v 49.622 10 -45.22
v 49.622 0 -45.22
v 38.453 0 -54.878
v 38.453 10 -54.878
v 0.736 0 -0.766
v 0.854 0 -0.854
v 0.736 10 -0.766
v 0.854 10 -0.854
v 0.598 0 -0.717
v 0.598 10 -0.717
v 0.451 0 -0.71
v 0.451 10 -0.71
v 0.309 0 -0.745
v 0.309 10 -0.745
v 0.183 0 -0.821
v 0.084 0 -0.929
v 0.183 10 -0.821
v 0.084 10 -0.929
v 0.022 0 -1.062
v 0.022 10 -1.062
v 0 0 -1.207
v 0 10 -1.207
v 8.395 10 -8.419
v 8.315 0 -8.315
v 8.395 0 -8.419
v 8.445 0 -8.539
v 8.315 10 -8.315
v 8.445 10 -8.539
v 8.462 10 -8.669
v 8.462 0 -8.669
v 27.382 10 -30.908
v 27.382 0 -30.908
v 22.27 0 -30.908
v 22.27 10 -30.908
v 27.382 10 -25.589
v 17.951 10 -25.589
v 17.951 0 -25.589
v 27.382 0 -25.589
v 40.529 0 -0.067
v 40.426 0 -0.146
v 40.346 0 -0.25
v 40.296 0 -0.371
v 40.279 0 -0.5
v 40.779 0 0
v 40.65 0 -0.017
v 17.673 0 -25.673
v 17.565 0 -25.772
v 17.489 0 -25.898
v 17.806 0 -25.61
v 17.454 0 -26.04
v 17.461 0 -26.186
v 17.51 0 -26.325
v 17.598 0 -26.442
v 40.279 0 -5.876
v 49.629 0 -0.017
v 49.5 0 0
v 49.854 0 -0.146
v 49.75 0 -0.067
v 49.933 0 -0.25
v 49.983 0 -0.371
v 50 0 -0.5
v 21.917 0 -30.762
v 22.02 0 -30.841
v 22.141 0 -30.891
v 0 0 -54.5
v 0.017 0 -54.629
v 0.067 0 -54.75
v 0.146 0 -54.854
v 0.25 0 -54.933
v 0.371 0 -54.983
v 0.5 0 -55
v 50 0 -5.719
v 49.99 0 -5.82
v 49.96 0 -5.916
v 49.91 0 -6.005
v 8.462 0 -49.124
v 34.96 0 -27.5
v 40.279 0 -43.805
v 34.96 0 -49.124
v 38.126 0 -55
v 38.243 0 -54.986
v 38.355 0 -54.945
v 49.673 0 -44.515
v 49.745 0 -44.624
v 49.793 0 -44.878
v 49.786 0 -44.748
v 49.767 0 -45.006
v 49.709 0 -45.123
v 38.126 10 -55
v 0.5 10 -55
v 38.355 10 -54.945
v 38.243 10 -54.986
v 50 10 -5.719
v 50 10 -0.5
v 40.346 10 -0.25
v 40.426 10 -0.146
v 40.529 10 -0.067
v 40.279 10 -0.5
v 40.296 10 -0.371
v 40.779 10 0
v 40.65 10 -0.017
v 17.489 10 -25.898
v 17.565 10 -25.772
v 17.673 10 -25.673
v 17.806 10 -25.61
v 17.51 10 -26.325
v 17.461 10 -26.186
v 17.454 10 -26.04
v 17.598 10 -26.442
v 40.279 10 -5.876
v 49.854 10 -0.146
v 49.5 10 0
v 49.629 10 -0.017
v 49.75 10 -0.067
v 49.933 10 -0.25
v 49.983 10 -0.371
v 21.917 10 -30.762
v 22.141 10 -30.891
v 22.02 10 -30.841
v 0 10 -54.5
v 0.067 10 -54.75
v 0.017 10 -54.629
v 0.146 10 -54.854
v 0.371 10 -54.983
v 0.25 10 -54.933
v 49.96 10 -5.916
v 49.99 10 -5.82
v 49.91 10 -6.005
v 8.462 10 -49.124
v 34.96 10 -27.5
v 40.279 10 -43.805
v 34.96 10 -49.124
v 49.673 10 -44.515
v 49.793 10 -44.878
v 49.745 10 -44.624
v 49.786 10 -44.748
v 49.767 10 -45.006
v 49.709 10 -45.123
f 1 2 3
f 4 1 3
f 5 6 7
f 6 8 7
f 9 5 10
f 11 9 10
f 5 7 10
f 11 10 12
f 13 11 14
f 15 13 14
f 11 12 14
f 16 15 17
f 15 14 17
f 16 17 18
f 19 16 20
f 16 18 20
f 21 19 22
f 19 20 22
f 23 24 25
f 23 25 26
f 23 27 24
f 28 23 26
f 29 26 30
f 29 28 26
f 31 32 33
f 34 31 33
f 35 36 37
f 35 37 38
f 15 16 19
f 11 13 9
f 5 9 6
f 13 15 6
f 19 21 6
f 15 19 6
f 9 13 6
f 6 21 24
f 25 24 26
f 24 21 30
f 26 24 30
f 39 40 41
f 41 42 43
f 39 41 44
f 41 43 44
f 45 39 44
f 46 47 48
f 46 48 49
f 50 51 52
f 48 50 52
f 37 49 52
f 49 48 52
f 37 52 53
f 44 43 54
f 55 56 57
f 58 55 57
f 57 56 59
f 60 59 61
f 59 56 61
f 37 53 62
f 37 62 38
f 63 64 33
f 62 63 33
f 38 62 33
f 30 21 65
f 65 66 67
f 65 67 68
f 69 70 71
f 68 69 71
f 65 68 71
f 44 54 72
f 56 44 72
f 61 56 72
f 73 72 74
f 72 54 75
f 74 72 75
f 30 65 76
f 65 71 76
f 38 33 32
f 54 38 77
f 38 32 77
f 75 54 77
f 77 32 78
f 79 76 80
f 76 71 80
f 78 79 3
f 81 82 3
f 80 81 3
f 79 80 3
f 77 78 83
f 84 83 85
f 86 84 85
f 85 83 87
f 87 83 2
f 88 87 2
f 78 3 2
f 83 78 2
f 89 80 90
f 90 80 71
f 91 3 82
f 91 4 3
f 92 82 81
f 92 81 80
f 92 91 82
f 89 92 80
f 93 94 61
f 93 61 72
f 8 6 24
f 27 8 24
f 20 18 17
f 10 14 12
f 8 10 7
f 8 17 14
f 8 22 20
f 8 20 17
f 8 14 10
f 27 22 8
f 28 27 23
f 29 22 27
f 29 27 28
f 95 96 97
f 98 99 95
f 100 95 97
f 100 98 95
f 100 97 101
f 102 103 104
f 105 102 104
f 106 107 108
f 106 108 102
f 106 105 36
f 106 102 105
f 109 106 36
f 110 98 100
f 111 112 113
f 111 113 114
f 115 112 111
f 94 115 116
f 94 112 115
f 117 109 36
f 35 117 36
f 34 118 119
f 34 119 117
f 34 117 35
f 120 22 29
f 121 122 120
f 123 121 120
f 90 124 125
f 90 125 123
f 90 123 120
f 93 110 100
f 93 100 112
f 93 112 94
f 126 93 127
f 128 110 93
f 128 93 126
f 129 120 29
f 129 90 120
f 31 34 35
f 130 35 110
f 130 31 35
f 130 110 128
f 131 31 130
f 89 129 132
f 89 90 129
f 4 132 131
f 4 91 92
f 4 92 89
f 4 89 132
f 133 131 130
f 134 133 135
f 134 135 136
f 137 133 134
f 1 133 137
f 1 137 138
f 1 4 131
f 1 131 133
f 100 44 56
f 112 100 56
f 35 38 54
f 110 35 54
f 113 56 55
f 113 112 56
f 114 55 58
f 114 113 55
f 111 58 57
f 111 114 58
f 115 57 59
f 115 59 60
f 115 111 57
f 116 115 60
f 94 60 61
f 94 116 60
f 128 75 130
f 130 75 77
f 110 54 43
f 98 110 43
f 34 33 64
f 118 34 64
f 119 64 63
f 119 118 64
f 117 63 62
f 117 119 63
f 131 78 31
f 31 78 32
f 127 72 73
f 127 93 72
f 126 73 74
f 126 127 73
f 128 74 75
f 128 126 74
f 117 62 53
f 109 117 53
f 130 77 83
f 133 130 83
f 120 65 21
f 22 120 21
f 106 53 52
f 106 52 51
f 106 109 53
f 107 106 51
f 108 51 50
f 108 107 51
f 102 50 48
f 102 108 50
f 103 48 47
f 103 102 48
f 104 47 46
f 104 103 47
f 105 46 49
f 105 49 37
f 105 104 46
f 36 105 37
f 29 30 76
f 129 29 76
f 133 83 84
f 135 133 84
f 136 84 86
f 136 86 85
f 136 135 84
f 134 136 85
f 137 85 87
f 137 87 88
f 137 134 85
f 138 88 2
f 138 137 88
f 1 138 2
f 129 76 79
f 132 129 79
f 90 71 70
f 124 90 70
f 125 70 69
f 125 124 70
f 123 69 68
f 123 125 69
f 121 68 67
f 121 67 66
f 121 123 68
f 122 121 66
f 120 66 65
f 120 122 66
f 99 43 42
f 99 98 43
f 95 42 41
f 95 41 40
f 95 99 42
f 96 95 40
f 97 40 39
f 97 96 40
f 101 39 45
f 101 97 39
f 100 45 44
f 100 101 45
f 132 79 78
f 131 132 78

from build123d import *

# Parameters (mm, degrees)
BOSS_EXTRUDE1_DEPTH = 10
FILLET1_R           = 0.5


with BuildPart() as part:
    # Sketch2 → Boss-Extrude1 (new body)
    with BuildSketch(Plane(origin=(0, 0, 0), x_dir=(1, 0, 0), z_dir=(0, 1, 0))):
        Polygon((0, 0), (8.461538462, 8.461538462), (8.461538462, 49.123931624), (34.959843123, 49.123931624), (40.27906686, 43.804707886), (27.382478632, 30.908119658), (22.063254895, 30.908119658), (16.744031157, 25.58889592), (27.382478632, 25.58889592), (40.27906686, 5.876068376), (40.27906686, 0), (50, 0), (50, 5.876068376), (34.959843123, 27.5), (50, 44.893162393), (38.311965812, 55), (0, 55), align=None)
    extrude(amount=BOSS_EXTRUDE1_DEPTH)

    # Fillet1
    fillet1_edges = [part.edges().sort_by_distance(p)[0] for p in [
        (0, 5, -55),
        (38.311965812, 5, -55),
        (50, 5, -44.893162393),
        (50, 5, -5.876068376),
        (50, 5, 0),
        (40.27906686, 5, 0),
        (16.744031157, 5, -25.58889592),
        (22.063254895, 5, -30.908119658),
        (8.461538462, 5, -8.461538462),
        (0, 5, 0),
    ]]
    fillet(fillet1_edges, radius=FILLET1_R)


solid = part.part
